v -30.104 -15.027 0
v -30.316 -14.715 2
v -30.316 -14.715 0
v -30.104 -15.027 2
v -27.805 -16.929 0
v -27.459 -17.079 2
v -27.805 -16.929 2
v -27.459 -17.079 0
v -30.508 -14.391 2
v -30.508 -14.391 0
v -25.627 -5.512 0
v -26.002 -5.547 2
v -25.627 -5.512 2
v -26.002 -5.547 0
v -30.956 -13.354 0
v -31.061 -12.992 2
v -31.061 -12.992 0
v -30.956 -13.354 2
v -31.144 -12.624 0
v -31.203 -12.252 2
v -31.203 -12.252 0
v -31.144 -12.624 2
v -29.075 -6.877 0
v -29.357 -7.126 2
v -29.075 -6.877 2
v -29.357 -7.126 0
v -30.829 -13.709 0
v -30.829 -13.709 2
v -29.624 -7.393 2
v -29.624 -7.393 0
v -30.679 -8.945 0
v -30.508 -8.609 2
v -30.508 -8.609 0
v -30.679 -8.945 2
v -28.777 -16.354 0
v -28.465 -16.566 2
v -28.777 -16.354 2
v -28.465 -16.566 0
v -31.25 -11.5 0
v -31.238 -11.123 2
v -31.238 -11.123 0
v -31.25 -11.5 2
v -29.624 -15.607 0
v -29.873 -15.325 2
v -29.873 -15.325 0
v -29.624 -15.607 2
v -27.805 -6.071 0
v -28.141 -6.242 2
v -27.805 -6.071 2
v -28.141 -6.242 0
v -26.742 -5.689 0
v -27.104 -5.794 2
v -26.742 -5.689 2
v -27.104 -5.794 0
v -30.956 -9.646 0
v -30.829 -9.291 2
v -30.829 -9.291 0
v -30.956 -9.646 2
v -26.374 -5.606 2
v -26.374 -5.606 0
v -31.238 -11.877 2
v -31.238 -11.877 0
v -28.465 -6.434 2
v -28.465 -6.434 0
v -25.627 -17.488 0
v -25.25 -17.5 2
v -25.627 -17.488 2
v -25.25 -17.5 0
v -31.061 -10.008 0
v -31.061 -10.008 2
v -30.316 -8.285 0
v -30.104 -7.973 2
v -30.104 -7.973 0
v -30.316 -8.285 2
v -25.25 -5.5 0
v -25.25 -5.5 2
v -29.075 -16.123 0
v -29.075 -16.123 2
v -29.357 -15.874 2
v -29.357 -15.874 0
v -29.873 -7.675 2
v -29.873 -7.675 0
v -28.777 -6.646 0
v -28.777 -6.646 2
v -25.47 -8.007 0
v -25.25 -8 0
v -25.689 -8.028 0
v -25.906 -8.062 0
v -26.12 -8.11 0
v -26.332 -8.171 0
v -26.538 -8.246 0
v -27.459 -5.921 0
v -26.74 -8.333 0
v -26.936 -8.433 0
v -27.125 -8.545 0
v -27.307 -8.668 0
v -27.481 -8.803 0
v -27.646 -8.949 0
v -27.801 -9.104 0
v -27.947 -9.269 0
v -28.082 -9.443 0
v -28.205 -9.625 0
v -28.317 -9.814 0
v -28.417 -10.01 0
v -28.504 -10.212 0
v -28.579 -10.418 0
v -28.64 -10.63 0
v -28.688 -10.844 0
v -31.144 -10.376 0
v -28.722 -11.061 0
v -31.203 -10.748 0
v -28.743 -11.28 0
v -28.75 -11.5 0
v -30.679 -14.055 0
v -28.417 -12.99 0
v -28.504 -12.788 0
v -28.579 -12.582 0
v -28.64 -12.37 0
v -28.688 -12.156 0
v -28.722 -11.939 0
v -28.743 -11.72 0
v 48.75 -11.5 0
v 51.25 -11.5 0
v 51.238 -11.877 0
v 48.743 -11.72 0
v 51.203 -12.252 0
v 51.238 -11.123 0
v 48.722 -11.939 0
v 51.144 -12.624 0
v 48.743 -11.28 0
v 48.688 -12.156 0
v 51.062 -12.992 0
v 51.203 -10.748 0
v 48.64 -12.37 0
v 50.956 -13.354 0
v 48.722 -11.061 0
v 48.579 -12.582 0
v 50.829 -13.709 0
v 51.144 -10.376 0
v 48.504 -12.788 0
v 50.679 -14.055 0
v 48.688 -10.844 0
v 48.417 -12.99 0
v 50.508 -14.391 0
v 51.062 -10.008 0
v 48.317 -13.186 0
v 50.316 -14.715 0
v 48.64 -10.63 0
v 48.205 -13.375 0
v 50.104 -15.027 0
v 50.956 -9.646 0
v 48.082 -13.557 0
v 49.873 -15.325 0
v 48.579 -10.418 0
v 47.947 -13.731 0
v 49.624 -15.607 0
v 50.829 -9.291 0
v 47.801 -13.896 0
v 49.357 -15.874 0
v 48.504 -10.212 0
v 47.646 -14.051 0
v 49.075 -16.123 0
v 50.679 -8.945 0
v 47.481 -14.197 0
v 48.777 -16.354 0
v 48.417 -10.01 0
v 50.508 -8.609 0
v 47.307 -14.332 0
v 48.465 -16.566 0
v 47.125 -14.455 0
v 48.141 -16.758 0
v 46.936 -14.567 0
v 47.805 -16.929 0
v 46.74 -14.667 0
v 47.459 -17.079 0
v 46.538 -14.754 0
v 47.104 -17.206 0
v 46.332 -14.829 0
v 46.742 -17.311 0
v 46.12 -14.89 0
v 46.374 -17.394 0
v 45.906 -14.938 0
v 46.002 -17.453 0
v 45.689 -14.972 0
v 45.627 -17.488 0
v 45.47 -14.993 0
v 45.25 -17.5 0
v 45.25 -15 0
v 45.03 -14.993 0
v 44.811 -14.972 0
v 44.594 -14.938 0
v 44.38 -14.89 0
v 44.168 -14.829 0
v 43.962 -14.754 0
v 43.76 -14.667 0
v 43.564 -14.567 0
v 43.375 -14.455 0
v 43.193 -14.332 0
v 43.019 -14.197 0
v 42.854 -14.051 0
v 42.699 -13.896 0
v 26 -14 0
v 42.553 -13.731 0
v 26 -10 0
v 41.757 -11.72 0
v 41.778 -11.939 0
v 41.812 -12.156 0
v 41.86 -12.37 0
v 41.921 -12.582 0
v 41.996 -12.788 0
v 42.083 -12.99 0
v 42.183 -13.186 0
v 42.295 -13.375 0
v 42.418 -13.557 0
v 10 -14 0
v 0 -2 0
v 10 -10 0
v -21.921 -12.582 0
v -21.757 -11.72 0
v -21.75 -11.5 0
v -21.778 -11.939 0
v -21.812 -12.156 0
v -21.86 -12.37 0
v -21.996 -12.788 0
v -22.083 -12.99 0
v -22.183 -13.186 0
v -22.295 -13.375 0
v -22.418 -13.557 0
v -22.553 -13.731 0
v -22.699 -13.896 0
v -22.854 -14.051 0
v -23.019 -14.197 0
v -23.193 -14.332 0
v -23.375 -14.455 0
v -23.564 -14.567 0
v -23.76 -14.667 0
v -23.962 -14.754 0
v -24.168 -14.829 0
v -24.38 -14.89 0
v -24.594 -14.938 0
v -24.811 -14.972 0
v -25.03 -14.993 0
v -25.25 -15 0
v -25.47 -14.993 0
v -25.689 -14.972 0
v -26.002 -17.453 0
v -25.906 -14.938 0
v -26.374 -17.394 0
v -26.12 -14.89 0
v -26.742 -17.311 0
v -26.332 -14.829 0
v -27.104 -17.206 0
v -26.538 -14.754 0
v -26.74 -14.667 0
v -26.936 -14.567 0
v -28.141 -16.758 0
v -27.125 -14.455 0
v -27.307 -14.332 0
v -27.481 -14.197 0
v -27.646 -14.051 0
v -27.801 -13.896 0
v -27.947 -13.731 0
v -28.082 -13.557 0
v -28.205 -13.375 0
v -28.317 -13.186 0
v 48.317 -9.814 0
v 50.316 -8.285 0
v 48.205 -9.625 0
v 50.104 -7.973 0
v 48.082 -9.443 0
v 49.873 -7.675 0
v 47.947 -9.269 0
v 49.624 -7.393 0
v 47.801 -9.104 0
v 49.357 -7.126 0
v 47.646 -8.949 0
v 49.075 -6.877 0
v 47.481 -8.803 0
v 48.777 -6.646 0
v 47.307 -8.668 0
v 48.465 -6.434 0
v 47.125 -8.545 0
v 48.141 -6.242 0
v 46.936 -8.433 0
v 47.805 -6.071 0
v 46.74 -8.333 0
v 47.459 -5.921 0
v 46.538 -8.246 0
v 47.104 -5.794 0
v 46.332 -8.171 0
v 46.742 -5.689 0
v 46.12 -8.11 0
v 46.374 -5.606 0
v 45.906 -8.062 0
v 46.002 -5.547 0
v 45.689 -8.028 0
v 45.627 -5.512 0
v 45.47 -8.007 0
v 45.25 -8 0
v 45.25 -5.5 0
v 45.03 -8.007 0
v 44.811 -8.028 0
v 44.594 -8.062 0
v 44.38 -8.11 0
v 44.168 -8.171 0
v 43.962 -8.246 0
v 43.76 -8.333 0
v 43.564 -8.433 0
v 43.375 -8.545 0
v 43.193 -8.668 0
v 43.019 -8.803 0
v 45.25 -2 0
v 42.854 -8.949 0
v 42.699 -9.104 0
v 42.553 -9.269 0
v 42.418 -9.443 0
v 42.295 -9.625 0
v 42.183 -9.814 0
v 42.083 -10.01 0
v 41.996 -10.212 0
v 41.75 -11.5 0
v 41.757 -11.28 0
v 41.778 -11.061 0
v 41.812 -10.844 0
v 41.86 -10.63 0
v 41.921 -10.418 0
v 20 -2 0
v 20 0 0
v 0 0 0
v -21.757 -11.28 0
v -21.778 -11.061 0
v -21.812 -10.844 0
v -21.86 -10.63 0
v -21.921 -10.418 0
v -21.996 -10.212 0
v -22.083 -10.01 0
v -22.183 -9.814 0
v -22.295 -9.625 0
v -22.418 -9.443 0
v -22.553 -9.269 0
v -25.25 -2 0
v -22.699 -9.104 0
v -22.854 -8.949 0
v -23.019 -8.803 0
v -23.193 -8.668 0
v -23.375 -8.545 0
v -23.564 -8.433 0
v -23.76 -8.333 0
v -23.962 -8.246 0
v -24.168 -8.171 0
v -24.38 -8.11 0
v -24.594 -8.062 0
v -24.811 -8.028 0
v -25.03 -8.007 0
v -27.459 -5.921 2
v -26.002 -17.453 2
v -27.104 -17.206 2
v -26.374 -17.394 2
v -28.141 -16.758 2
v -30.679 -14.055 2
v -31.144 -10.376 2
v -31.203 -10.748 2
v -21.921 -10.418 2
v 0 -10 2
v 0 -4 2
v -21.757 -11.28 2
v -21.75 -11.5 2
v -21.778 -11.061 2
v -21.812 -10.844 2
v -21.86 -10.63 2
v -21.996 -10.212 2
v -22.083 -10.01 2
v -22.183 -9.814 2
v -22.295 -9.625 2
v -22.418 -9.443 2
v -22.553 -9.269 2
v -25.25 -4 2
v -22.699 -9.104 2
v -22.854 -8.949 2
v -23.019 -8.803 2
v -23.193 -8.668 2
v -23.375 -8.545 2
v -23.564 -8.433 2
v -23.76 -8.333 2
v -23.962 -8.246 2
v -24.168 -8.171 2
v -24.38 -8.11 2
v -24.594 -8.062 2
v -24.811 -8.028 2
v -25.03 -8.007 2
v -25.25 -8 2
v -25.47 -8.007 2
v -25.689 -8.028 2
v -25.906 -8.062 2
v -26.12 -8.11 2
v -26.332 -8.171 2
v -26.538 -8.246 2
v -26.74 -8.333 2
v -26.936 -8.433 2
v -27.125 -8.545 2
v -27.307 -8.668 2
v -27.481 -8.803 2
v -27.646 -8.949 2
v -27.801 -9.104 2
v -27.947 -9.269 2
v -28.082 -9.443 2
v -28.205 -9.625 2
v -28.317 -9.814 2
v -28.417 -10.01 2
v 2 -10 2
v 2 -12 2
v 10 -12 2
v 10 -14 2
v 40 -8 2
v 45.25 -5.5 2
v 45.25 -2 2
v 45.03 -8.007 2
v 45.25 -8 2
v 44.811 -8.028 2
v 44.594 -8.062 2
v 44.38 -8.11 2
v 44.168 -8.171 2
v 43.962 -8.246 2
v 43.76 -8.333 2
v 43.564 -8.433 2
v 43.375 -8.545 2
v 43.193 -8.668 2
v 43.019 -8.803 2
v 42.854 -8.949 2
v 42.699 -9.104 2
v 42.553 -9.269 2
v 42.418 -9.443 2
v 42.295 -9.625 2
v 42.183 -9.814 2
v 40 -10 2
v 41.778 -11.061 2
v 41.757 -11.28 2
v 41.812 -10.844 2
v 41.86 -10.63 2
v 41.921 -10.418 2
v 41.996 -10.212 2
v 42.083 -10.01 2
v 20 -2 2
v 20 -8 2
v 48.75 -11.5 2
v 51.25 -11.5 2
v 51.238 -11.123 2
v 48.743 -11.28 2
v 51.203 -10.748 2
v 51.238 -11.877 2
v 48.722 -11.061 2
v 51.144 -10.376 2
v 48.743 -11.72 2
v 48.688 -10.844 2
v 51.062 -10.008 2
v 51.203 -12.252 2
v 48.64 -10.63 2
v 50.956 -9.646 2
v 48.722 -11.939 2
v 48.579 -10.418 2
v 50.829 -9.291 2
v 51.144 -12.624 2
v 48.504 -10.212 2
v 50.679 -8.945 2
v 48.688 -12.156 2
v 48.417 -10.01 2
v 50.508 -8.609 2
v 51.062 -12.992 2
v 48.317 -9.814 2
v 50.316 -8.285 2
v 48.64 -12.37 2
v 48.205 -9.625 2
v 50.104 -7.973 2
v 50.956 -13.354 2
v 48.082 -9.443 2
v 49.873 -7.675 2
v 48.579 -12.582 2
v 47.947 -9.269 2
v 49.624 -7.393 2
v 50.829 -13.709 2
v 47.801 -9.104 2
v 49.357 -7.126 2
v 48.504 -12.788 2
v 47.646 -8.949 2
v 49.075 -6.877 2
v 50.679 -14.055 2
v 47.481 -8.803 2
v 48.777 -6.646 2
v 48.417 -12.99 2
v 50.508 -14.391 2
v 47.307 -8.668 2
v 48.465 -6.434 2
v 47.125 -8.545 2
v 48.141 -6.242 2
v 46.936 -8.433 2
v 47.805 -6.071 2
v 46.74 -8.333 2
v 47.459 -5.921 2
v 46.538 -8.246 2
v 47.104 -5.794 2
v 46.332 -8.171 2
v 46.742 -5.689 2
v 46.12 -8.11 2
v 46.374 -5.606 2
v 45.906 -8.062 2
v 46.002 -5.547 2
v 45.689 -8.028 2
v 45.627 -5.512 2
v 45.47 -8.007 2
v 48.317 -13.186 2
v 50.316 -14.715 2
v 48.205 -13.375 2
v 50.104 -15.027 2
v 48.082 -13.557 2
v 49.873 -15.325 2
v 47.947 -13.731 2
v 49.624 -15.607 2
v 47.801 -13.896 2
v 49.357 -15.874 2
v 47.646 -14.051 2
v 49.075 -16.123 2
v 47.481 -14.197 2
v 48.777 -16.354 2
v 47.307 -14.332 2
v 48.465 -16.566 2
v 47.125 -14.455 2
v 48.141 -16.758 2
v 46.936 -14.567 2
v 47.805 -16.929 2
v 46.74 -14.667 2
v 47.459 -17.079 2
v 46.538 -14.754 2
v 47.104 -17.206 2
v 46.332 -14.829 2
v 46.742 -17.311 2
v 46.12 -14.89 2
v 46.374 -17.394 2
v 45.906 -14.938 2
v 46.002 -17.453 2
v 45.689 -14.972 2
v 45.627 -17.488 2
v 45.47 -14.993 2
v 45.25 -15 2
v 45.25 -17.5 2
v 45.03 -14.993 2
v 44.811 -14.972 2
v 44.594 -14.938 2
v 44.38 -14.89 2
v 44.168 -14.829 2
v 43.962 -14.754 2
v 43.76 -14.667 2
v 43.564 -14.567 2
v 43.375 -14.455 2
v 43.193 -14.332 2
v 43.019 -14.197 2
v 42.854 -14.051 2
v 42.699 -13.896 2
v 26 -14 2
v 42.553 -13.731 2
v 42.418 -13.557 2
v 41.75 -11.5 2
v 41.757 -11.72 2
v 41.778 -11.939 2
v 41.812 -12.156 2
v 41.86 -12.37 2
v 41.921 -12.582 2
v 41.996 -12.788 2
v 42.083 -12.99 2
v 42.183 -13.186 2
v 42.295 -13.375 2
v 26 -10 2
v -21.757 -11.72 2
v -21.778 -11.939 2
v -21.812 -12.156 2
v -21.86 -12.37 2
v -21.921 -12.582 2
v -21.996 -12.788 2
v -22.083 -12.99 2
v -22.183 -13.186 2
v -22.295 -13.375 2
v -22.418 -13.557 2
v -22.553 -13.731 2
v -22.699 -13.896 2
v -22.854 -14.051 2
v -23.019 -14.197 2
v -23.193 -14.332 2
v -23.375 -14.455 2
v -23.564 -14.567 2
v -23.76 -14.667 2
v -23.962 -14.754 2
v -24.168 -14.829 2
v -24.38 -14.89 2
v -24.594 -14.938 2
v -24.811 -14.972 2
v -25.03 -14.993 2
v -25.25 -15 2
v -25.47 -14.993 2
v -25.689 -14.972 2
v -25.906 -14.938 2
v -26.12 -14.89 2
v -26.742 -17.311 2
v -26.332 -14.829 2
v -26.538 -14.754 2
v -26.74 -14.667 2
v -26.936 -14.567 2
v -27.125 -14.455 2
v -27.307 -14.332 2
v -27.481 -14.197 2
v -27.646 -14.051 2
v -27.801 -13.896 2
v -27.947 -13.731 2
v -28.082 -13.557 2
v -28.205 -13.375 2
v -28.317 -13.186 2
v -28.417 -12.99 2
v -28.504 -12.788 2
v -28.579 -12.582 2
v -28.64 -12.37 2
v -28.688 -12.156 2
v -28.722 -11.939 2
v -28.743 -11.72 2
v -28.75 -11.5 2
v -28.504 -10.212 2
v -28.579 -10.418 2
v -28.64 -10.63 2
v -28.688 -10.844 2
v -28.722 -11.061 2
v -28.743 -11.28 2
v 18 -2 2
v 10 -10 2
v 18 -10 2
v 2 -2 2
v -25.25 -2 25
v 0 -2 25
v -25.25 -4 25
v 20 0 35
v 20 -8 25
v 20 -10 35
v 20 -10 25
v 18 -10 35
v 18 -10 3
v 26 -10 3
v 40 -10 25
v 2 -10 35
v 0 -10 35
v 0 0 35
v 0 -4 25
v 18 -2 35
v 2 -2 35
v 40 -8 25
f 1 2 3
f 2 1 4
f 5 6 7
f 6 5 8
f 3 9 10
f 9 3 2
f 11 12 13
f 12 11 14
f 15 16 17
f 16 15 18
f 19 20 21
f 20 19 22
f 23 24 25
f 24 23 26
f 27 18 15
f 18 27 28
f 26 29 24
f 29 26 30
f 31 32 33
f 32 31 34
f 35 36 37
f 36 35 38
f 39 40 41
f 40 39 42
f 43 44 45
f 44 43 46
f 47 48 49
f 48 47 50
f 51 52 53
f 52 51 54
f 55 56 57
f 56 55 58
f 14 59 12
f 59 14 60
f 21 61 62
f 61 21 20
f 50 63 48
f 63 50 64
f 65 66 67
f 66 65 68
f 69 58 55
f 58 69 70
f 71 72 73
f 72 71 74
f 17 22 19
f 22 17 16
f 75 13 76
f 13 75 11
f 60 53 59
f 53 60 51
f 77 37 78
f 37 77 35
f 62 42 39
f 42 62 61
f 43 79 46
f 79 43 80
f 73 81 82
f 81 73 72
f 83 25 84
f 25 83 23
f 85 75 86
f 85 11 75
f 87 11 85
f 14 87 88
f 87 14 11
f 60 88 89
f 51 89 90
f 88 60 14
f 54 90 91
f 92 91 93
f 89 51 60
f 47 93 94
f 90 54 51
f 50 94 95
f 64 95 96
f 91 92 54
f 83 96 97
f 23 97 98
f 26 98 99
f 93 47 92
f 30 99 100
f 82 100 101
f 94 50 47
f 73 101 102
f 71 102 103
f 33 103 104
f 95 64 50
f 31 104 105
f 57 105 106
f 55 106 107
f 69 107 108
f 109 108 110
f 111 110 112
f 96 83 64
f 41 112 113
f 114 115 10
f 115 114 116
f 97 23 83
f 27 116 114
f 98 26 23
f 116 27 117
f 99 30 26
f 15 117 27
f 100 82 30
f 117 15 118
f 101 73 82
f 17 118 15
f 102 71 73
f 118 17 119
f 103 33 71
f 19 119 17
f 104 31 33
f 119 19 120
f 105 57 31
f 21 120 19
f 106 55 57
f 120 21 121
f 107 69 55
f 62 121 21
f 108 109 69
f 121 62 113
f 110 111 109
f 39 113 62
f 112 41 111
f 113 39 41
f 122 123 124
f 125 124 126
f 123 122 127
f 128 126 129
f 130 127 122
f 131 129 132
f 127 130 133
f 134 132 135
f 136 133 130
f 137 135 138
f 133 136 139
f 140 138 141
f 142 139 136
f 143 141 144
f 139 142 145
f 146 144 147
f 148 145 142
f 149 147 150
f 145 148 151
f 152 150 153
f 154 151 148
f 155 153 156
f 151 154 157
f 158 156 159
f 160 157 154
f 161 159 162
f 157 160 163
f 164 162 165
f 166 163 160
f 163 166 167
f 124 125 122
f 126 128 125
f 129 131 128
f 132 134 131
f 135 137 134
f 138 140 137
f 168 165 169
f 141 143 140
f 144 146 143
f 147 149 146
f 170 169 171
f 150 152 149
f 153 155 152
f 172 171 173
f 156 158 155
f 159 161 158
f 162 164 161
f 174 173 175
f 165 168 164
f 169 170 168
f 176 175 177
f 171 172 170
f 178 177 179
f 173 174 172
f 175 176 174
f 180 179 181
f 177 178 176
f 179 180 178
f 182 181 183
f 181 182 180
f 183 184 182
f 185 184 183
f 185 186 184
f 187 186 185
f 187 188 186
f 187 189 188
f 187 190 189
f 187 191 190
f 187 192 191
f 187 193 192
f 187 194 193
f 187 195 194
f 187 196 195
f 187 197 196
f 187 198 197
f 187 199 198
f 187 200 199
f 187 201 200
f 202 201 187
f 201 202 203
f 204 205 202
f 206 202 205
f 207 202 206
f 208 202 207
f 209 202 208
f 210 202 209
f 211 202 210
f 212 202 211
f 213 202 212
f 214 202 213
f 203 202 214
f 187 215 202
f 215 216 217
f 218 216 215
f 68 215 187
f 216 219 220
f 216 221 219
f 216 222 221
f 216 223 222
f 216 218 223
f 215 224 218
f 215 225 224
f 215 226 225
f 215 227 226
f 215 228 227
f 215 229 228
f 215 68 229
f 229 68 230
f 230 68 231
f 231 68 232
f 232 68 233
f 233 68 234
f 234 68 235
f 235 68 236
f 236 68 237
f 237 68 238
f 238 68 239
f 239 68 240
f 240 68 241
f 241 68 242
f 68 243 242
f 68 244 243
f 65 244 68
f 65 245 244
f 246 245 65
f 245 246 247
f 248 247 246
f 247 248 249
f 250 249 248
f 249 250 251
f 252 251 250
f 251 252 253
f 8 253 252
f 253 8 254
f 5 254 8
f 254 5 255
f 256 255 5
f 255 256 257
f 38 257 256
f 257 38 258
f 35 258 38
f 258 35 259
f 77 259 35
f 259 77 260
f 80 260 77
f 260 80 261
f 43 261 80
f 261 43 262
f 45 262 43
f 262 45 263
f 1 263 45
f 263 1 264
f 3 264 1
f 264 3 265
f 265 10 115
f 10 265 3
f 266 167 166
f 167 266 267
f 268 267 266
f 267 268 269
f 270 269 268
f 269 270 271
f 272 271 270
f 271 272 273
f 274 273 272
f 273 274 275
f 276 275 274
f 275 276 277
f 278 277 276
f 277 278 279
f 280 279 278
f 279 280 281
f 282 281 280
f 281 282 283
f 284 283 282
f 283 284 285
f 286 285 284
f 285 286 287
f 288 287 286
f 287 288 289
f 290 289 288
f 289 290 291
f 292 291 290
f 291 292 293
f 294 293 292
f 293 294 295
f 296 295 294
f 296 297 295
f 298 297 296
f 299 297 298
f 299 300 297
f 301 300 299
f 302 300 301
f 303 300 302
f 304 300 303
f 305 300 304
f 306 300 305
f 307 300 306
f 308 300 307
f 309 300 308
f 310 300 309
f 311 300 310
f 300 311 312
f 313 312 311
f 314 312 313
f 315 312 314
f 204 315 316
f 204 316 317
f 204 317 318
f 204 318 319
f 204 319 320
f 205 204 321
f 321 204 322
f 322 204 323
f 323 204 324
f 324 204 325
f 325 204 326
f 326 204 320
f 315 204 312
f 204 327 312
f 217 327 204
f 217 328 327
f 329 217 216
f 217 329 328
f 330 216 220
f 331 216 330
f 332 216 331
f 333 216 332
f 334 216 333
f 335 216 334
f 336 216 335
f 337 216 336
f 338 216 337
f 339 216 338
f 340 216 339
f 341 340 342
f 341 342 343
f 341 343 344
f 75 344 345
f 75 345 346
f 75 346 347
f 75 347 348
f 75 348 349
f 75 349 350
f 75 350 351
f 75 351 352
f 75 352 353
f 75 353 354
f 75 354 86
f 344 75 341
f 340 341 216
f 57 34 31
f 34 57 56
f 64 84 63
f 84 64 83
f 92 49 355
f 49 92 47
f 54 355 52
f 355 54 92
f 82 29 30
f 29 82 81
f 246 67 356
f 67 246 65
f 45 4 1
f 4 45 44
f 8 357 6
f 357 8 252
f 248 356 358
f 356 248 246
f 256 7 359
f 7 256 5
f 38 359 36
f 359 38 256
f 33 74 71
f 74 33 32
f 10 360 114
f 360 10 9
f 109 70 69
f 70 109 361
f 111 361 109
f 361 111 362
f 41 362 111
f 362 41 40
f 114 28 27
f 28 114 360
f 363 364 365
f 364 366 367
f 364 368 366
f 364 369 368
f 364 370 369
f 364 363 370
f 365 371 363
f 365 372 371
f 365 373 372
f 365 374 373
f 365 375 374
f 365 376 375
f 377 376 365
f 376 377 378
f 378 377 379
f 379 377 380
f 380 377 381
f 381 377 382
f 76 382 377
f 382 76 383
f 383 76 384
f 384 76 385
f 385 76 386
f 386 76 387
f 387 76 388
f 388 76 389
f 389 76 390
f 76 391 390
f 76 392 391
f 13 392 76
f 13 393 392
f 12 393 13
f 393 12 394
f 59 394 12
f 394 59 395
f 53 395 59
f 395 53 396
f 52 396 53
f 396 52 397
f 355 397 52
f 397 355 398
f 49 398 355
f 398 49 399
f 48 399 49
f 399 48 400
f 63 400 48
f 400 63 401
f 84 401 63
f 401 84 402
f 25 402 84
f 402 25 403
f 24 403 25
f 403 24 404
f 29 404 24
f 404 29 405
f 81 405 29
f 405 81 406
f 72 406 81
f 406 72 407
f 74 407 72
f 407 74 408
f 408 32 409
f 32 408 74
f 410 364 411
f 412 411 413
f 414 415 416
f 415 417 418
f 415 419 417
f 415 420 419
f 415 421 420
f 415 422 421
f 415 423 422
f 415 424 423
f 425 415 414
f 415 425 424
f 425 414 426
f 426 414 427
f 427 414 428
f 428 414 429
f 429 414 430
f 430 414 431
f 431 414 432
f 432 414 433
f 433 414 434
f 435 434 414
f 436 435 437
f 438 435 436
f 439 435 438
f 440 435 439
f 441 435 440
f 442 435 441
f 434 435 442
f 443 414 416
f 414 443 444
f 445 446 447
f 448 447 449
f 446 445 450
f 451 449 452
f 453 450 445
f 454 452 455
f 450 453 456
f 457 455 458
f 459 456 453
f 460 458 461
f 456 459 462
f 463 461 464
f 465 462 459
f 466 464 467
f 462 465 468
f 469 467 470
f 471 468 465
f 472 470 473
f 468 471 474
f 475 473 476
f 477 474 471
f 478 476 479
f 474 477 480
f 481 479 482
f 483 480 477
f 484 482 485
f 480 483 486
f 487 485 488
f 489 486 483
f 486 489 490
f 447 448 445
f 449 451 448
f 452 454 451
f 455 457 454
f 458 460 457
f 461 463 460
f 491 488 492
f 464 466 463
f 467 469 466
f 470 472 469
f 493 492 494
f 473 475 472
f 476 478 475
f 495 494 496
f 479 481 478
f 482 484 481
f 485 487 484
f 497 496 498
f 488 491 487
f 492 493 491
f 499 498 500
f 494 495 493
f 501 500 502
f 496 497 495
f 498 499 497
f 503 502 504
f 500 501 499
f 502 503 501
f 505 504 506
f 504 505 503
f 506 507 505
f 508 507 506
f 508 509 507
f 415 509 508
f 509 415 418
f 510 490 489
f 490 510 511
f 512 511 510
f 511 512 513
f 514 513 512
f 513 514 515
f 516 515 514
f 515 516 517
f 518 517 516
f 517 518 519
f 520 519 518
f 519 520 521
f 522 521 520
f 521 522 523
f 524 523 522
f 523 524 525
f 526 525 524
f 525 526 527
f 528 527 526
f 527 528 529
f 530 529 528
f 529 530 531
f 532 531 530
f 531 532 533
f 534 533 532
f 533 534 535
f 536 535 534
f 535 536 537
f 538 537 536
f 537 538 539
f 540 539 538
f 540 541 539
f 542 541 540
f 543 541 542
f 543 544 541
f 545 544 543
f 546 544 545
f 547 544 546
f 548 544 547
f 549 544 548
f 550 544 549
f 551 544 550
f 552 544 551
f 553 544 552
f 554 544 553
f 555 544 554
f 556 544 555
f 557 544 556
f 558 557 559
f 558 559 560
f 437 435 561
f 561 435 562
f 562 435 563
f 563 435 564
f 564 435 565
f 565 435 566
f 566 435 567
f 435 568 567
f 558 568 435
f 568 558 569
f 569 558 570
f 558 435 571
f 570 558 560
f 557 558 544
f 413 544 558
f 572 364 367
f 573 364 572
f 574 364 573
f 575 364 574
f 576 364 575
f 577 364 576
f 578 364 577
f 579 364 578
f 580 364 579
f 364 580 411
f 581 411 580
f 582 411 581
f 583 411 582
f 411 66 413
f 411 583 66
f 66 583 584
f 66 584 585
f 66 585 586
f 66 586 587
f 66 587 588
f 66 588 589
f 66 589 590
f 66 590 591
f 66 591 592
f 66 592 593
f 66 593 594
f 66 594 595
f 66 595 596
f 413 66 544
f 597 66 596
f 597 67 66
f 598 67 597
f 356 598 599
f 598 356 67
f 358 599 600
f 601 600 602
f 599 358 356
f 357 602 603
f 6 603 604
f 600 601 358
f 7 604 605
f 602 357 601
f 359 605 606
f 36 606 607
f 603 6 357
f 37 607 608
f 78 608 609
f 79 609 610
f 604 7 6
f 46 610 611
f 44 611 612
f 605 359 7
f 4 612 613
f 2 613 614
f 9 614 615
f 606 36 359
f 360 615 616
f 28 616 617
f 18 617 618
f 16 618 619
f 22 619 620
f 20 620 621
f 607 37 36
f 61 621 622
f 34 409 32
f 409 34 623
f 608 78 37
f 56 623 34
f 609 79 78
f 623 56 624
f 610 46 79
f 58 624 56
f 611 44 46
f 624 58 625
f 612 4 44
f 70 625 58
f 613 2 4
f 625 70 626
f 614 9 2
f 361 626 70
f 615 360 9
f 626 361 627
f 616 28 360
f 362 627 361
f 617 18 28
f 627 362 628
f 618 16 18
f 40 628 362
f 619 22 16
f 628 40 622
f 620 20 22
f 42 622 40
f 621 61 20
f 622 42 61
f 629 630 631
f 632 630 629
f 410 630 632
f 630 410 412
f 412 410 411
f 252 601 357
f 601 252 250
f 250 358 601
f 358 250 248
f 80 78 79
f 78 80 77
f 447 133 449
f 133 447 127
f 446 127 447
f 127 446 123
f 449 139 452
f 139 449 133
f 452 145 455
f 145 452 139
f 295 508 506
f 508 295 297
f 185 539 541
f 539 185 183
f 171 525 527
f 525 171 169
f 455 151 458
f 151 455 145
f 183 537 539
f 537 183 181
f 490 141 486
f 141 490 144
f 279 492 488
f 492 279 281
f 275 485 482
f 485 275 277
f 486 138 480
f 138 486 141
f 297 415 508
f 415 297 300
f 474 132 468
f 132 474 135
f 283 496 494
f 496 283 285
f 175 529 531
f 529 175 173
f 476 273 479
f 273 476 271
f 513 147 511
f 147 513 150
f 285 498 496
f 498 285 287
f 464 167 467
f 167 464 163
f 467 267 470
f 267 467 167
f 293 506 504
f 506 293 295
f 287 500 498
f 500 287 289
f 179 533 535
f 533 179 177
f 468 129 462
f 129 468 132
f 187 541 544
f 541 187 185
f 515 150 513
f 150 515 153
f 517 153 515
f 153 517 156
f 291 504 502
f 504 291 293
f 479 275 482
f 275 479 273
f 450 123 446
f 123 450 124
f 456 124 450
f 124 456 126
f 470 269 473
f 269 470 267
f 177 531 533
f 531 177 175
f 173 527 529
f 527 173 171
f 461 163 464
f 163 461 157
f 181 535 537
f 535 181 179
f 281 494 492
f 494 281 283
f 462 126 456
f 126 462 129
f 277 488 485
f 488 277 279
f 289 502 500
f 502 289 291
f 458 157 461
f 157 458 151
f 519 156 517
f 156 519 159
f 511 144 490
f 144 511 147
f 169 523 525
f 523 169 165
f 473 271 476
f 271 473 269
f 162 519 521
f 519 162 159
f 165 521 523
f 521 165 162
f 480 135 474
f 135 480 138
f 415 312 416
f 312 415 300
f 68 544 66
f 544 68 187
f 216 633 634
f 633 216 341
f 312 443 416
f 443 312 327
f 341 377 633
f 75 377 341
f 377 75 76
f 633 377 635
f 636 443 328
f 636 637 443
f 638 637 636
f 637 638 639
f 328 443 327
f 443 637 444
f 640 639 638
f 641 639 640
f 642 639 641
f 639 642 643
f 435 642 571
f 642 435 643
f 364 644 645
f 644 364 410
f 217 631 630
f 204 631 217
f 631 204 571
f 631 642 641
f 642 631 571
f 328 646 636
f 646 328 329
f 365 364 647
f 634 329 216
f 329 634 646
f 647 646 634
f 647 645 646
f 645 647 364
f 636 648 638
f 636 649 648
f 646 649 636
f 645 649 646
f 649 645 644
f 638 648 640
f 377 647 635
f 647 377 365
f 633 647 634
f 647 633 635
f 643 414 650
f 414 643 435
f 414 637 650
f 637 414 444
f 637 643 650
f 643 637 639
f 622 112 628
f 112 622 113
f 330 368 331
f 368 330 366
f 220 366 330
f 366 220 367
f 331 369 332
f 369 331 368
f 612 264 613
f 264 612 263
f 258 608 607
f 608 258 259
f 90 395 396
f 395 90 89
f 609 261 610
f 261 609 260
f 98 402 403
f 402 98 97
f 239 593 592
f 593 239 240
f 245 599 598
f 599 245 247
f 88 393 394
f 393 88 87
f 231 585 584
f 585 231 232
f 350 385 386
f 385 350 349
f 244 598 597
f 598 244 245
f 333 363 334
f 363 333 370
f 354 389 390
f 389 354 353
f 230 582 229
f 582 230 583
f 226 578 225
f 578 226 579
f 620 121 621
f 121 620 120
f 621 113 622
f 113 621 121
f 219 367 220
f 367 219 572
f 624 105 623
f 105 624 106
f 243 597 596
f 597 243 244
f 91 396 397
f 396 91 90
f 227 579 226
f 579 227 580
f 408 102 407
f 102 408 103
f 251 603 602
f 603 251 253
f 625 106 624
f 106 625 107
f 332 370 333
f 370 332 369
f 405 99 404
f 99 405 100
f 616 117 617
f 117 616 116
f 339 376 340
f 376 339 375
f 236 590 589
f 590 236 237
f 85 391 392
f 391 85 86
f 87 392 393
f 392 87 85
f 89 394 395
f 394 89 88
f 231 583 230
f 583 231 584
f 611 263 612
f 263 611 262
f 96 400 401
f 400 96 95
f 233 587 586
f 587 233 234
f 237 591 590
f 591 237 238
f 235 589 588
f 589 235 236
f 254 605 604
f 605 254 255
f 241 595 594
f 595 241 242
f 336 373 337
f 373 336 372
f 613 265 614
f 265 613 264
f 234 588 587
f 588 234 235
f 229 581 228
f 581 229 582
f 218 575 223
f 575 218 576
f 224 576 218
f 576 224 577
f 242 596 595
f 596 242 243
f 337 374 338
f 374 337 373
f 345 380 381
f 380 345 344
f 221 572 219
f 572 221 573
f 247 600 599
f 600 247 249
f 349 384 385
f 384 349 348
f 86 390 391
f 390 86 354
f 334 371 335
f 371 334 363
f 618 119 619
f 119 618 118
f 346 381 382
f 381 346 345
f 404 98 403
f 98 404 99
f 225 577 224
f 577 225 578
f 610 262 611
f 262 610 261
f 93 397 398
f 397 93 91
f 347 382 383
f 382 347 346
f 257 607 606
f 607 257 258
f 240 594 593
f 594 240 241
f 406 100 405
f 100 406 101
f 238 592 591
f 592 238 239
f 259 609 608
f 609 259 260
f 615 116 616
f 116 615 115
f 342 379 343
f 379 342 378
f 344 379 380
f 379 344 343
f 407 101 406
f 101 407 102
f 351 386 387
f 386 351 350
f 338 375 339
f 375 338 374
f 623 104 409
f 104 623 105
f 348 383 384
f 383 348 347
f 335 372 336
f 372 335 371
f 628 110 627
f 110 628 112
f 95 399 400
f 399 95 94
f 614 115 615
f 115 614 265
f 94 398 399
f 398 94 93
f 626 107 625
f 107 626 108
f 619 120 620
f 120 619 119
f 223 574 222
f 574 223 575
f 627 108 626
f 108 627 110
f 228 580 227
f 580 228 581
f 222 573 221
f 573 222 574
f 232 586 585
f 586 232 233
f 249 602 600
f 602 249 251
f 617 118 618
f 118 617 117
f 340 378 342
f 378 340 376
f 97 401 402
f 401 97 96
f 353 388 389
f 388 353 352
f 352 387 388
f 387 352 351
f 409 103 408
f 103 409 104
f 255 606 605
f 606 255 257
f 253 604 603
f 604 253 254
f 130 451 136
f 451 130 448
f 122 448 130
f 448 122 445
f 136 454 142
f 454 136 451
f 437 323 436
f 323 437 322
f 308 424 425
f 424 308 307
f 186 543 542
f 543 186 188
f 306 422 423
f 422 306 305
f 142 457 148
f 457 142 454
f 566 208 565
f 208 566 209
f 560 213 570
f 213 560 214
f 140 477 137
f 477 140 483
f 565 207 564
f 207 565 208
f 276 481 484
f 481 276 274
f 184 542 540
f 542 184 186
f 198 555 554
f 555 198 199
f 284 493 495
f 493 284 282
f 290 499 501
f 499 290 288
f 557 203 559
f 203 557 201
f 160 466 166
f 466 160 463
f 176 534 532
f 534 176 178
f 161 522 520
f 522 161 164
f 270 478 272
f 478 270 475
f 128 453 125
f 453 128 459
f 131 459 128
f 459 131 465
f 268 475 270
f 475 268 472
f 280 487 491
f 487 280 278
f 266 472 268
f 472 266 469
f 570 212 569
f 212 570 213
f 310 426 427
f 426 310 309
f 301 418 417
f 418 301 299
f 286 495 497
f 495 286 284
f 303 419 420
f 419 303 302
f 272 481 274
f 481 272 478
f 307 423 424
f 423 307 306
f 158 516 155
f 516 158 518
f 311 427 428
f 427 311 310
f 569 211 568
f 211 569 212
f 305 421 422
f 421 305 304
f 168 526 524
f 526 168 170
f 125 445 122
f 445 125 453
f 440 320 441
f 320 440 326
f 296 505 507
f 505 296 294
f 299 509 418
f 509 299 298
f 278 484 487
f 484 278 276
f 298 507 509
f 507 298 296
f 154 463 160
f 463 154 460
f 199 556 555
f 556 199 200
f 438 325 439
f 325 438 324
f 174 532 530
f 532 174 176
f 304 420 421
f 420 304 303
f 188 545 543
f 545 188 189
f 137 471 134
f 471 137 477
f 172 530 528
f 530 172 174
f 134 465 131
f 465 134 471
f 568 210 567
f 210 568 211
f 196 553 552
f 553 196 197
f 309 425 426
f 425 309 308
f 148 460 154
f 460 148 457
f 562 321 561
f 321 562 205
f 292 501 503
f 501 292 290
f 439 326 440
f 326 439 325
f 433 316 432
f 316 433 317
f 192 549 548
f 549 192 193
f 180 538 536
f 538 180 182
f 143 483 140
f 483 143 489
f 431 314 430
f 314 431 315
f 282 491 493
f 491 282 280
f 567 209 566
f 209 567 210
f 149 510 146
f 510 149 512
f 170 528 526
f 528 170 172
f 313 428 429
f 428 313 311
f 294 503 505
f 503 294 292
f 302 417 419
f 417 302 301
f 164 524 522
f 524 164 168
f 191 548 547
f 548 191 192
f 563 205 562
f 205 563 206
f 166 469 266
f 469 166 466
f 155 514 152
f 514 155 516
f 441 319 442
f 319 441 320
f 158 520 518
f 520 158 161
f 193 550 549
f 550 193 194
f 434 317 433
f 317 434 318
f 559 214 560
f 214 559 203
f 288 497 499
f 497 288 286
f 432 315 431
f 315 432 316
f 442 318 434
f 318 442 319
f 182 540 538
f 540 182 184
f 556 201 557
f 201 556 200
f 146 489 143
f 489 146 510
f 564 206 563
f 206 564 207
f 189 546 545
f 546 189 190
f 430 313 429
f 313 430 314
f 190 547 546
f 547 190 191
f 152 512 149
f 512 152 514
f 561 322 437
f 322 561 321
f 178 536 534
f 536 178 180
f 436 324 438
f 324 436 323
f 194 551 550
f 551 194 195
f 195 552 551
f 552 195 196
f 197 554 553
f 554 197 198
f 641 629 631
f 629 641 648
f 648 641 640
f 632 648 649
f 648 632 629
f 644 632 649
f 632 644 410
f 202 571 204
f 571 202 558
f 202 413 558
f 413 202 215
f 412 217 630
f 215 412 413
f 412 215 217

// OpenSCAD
wingThickness = 2;
rxHeight = 6;

// Print rotation
rotate([90, 0, 0]) {
    difference() {

        // Additive
        union(){

            // Basic block
            body();

            // Front plate
            frontPlate();
            
            // Left wing
            leftWing();

            // Right wing
            rightWing();
        }

        // Subtractive
        union(){
            
            // Hollow out main cube
            hollowCube();
            
            // Antenna holes
            antennaHoles();
            
            // Controller holes
            controllerHoles();
        }
    }   
}

module body() {
   // Outer shape
   cube([20, 35, 10]);
}

module frontPlate() {
    union() {
        translate([-25.25, 0, 2]) {
            cube([70.5, 2, 15.5]);
        }
        rotate([-90, 0, 0]) {
            translate([-25.25, -11.5, 0]) {
                cylinder(r=6, h=2, $fn=100);
            }
            translate([45.25, -11.5, 0]) {
                cylinder(r=6, h=2, $fn=100);
            }
        }
    }
}

module leftWing() {
    translate([-25.25, 0, 10-wingThickness-rxHeight]) {
        // Wing main
        cube([25.25, 25, wingThickness]);   
    }
}

module rightWing() {
    translate([20, 0, 10-wingThickness]) {
        // Wing main
        cube([20, 25, wingThickness]);   
    }
}

module hollowCube() {
    translate([2, 2, 2]){
        cube([16, 35, 10]);
    }
}

module antennaHoles() {
    rotate([-90, 0, 0]) {
        translate([-25.25, -11.5, -1]) {
            cylinder(r=3.5, h=4, $fn=100);
        }
        translate([45.25, -11.5, -1]) {
            cylinder(r=3.5, h=4, $fn=100);
        }
    }
}

module controllerHoles() {
    translate([10, -1, 10]) {
        cube([16, 4, 4]);
    }
}
